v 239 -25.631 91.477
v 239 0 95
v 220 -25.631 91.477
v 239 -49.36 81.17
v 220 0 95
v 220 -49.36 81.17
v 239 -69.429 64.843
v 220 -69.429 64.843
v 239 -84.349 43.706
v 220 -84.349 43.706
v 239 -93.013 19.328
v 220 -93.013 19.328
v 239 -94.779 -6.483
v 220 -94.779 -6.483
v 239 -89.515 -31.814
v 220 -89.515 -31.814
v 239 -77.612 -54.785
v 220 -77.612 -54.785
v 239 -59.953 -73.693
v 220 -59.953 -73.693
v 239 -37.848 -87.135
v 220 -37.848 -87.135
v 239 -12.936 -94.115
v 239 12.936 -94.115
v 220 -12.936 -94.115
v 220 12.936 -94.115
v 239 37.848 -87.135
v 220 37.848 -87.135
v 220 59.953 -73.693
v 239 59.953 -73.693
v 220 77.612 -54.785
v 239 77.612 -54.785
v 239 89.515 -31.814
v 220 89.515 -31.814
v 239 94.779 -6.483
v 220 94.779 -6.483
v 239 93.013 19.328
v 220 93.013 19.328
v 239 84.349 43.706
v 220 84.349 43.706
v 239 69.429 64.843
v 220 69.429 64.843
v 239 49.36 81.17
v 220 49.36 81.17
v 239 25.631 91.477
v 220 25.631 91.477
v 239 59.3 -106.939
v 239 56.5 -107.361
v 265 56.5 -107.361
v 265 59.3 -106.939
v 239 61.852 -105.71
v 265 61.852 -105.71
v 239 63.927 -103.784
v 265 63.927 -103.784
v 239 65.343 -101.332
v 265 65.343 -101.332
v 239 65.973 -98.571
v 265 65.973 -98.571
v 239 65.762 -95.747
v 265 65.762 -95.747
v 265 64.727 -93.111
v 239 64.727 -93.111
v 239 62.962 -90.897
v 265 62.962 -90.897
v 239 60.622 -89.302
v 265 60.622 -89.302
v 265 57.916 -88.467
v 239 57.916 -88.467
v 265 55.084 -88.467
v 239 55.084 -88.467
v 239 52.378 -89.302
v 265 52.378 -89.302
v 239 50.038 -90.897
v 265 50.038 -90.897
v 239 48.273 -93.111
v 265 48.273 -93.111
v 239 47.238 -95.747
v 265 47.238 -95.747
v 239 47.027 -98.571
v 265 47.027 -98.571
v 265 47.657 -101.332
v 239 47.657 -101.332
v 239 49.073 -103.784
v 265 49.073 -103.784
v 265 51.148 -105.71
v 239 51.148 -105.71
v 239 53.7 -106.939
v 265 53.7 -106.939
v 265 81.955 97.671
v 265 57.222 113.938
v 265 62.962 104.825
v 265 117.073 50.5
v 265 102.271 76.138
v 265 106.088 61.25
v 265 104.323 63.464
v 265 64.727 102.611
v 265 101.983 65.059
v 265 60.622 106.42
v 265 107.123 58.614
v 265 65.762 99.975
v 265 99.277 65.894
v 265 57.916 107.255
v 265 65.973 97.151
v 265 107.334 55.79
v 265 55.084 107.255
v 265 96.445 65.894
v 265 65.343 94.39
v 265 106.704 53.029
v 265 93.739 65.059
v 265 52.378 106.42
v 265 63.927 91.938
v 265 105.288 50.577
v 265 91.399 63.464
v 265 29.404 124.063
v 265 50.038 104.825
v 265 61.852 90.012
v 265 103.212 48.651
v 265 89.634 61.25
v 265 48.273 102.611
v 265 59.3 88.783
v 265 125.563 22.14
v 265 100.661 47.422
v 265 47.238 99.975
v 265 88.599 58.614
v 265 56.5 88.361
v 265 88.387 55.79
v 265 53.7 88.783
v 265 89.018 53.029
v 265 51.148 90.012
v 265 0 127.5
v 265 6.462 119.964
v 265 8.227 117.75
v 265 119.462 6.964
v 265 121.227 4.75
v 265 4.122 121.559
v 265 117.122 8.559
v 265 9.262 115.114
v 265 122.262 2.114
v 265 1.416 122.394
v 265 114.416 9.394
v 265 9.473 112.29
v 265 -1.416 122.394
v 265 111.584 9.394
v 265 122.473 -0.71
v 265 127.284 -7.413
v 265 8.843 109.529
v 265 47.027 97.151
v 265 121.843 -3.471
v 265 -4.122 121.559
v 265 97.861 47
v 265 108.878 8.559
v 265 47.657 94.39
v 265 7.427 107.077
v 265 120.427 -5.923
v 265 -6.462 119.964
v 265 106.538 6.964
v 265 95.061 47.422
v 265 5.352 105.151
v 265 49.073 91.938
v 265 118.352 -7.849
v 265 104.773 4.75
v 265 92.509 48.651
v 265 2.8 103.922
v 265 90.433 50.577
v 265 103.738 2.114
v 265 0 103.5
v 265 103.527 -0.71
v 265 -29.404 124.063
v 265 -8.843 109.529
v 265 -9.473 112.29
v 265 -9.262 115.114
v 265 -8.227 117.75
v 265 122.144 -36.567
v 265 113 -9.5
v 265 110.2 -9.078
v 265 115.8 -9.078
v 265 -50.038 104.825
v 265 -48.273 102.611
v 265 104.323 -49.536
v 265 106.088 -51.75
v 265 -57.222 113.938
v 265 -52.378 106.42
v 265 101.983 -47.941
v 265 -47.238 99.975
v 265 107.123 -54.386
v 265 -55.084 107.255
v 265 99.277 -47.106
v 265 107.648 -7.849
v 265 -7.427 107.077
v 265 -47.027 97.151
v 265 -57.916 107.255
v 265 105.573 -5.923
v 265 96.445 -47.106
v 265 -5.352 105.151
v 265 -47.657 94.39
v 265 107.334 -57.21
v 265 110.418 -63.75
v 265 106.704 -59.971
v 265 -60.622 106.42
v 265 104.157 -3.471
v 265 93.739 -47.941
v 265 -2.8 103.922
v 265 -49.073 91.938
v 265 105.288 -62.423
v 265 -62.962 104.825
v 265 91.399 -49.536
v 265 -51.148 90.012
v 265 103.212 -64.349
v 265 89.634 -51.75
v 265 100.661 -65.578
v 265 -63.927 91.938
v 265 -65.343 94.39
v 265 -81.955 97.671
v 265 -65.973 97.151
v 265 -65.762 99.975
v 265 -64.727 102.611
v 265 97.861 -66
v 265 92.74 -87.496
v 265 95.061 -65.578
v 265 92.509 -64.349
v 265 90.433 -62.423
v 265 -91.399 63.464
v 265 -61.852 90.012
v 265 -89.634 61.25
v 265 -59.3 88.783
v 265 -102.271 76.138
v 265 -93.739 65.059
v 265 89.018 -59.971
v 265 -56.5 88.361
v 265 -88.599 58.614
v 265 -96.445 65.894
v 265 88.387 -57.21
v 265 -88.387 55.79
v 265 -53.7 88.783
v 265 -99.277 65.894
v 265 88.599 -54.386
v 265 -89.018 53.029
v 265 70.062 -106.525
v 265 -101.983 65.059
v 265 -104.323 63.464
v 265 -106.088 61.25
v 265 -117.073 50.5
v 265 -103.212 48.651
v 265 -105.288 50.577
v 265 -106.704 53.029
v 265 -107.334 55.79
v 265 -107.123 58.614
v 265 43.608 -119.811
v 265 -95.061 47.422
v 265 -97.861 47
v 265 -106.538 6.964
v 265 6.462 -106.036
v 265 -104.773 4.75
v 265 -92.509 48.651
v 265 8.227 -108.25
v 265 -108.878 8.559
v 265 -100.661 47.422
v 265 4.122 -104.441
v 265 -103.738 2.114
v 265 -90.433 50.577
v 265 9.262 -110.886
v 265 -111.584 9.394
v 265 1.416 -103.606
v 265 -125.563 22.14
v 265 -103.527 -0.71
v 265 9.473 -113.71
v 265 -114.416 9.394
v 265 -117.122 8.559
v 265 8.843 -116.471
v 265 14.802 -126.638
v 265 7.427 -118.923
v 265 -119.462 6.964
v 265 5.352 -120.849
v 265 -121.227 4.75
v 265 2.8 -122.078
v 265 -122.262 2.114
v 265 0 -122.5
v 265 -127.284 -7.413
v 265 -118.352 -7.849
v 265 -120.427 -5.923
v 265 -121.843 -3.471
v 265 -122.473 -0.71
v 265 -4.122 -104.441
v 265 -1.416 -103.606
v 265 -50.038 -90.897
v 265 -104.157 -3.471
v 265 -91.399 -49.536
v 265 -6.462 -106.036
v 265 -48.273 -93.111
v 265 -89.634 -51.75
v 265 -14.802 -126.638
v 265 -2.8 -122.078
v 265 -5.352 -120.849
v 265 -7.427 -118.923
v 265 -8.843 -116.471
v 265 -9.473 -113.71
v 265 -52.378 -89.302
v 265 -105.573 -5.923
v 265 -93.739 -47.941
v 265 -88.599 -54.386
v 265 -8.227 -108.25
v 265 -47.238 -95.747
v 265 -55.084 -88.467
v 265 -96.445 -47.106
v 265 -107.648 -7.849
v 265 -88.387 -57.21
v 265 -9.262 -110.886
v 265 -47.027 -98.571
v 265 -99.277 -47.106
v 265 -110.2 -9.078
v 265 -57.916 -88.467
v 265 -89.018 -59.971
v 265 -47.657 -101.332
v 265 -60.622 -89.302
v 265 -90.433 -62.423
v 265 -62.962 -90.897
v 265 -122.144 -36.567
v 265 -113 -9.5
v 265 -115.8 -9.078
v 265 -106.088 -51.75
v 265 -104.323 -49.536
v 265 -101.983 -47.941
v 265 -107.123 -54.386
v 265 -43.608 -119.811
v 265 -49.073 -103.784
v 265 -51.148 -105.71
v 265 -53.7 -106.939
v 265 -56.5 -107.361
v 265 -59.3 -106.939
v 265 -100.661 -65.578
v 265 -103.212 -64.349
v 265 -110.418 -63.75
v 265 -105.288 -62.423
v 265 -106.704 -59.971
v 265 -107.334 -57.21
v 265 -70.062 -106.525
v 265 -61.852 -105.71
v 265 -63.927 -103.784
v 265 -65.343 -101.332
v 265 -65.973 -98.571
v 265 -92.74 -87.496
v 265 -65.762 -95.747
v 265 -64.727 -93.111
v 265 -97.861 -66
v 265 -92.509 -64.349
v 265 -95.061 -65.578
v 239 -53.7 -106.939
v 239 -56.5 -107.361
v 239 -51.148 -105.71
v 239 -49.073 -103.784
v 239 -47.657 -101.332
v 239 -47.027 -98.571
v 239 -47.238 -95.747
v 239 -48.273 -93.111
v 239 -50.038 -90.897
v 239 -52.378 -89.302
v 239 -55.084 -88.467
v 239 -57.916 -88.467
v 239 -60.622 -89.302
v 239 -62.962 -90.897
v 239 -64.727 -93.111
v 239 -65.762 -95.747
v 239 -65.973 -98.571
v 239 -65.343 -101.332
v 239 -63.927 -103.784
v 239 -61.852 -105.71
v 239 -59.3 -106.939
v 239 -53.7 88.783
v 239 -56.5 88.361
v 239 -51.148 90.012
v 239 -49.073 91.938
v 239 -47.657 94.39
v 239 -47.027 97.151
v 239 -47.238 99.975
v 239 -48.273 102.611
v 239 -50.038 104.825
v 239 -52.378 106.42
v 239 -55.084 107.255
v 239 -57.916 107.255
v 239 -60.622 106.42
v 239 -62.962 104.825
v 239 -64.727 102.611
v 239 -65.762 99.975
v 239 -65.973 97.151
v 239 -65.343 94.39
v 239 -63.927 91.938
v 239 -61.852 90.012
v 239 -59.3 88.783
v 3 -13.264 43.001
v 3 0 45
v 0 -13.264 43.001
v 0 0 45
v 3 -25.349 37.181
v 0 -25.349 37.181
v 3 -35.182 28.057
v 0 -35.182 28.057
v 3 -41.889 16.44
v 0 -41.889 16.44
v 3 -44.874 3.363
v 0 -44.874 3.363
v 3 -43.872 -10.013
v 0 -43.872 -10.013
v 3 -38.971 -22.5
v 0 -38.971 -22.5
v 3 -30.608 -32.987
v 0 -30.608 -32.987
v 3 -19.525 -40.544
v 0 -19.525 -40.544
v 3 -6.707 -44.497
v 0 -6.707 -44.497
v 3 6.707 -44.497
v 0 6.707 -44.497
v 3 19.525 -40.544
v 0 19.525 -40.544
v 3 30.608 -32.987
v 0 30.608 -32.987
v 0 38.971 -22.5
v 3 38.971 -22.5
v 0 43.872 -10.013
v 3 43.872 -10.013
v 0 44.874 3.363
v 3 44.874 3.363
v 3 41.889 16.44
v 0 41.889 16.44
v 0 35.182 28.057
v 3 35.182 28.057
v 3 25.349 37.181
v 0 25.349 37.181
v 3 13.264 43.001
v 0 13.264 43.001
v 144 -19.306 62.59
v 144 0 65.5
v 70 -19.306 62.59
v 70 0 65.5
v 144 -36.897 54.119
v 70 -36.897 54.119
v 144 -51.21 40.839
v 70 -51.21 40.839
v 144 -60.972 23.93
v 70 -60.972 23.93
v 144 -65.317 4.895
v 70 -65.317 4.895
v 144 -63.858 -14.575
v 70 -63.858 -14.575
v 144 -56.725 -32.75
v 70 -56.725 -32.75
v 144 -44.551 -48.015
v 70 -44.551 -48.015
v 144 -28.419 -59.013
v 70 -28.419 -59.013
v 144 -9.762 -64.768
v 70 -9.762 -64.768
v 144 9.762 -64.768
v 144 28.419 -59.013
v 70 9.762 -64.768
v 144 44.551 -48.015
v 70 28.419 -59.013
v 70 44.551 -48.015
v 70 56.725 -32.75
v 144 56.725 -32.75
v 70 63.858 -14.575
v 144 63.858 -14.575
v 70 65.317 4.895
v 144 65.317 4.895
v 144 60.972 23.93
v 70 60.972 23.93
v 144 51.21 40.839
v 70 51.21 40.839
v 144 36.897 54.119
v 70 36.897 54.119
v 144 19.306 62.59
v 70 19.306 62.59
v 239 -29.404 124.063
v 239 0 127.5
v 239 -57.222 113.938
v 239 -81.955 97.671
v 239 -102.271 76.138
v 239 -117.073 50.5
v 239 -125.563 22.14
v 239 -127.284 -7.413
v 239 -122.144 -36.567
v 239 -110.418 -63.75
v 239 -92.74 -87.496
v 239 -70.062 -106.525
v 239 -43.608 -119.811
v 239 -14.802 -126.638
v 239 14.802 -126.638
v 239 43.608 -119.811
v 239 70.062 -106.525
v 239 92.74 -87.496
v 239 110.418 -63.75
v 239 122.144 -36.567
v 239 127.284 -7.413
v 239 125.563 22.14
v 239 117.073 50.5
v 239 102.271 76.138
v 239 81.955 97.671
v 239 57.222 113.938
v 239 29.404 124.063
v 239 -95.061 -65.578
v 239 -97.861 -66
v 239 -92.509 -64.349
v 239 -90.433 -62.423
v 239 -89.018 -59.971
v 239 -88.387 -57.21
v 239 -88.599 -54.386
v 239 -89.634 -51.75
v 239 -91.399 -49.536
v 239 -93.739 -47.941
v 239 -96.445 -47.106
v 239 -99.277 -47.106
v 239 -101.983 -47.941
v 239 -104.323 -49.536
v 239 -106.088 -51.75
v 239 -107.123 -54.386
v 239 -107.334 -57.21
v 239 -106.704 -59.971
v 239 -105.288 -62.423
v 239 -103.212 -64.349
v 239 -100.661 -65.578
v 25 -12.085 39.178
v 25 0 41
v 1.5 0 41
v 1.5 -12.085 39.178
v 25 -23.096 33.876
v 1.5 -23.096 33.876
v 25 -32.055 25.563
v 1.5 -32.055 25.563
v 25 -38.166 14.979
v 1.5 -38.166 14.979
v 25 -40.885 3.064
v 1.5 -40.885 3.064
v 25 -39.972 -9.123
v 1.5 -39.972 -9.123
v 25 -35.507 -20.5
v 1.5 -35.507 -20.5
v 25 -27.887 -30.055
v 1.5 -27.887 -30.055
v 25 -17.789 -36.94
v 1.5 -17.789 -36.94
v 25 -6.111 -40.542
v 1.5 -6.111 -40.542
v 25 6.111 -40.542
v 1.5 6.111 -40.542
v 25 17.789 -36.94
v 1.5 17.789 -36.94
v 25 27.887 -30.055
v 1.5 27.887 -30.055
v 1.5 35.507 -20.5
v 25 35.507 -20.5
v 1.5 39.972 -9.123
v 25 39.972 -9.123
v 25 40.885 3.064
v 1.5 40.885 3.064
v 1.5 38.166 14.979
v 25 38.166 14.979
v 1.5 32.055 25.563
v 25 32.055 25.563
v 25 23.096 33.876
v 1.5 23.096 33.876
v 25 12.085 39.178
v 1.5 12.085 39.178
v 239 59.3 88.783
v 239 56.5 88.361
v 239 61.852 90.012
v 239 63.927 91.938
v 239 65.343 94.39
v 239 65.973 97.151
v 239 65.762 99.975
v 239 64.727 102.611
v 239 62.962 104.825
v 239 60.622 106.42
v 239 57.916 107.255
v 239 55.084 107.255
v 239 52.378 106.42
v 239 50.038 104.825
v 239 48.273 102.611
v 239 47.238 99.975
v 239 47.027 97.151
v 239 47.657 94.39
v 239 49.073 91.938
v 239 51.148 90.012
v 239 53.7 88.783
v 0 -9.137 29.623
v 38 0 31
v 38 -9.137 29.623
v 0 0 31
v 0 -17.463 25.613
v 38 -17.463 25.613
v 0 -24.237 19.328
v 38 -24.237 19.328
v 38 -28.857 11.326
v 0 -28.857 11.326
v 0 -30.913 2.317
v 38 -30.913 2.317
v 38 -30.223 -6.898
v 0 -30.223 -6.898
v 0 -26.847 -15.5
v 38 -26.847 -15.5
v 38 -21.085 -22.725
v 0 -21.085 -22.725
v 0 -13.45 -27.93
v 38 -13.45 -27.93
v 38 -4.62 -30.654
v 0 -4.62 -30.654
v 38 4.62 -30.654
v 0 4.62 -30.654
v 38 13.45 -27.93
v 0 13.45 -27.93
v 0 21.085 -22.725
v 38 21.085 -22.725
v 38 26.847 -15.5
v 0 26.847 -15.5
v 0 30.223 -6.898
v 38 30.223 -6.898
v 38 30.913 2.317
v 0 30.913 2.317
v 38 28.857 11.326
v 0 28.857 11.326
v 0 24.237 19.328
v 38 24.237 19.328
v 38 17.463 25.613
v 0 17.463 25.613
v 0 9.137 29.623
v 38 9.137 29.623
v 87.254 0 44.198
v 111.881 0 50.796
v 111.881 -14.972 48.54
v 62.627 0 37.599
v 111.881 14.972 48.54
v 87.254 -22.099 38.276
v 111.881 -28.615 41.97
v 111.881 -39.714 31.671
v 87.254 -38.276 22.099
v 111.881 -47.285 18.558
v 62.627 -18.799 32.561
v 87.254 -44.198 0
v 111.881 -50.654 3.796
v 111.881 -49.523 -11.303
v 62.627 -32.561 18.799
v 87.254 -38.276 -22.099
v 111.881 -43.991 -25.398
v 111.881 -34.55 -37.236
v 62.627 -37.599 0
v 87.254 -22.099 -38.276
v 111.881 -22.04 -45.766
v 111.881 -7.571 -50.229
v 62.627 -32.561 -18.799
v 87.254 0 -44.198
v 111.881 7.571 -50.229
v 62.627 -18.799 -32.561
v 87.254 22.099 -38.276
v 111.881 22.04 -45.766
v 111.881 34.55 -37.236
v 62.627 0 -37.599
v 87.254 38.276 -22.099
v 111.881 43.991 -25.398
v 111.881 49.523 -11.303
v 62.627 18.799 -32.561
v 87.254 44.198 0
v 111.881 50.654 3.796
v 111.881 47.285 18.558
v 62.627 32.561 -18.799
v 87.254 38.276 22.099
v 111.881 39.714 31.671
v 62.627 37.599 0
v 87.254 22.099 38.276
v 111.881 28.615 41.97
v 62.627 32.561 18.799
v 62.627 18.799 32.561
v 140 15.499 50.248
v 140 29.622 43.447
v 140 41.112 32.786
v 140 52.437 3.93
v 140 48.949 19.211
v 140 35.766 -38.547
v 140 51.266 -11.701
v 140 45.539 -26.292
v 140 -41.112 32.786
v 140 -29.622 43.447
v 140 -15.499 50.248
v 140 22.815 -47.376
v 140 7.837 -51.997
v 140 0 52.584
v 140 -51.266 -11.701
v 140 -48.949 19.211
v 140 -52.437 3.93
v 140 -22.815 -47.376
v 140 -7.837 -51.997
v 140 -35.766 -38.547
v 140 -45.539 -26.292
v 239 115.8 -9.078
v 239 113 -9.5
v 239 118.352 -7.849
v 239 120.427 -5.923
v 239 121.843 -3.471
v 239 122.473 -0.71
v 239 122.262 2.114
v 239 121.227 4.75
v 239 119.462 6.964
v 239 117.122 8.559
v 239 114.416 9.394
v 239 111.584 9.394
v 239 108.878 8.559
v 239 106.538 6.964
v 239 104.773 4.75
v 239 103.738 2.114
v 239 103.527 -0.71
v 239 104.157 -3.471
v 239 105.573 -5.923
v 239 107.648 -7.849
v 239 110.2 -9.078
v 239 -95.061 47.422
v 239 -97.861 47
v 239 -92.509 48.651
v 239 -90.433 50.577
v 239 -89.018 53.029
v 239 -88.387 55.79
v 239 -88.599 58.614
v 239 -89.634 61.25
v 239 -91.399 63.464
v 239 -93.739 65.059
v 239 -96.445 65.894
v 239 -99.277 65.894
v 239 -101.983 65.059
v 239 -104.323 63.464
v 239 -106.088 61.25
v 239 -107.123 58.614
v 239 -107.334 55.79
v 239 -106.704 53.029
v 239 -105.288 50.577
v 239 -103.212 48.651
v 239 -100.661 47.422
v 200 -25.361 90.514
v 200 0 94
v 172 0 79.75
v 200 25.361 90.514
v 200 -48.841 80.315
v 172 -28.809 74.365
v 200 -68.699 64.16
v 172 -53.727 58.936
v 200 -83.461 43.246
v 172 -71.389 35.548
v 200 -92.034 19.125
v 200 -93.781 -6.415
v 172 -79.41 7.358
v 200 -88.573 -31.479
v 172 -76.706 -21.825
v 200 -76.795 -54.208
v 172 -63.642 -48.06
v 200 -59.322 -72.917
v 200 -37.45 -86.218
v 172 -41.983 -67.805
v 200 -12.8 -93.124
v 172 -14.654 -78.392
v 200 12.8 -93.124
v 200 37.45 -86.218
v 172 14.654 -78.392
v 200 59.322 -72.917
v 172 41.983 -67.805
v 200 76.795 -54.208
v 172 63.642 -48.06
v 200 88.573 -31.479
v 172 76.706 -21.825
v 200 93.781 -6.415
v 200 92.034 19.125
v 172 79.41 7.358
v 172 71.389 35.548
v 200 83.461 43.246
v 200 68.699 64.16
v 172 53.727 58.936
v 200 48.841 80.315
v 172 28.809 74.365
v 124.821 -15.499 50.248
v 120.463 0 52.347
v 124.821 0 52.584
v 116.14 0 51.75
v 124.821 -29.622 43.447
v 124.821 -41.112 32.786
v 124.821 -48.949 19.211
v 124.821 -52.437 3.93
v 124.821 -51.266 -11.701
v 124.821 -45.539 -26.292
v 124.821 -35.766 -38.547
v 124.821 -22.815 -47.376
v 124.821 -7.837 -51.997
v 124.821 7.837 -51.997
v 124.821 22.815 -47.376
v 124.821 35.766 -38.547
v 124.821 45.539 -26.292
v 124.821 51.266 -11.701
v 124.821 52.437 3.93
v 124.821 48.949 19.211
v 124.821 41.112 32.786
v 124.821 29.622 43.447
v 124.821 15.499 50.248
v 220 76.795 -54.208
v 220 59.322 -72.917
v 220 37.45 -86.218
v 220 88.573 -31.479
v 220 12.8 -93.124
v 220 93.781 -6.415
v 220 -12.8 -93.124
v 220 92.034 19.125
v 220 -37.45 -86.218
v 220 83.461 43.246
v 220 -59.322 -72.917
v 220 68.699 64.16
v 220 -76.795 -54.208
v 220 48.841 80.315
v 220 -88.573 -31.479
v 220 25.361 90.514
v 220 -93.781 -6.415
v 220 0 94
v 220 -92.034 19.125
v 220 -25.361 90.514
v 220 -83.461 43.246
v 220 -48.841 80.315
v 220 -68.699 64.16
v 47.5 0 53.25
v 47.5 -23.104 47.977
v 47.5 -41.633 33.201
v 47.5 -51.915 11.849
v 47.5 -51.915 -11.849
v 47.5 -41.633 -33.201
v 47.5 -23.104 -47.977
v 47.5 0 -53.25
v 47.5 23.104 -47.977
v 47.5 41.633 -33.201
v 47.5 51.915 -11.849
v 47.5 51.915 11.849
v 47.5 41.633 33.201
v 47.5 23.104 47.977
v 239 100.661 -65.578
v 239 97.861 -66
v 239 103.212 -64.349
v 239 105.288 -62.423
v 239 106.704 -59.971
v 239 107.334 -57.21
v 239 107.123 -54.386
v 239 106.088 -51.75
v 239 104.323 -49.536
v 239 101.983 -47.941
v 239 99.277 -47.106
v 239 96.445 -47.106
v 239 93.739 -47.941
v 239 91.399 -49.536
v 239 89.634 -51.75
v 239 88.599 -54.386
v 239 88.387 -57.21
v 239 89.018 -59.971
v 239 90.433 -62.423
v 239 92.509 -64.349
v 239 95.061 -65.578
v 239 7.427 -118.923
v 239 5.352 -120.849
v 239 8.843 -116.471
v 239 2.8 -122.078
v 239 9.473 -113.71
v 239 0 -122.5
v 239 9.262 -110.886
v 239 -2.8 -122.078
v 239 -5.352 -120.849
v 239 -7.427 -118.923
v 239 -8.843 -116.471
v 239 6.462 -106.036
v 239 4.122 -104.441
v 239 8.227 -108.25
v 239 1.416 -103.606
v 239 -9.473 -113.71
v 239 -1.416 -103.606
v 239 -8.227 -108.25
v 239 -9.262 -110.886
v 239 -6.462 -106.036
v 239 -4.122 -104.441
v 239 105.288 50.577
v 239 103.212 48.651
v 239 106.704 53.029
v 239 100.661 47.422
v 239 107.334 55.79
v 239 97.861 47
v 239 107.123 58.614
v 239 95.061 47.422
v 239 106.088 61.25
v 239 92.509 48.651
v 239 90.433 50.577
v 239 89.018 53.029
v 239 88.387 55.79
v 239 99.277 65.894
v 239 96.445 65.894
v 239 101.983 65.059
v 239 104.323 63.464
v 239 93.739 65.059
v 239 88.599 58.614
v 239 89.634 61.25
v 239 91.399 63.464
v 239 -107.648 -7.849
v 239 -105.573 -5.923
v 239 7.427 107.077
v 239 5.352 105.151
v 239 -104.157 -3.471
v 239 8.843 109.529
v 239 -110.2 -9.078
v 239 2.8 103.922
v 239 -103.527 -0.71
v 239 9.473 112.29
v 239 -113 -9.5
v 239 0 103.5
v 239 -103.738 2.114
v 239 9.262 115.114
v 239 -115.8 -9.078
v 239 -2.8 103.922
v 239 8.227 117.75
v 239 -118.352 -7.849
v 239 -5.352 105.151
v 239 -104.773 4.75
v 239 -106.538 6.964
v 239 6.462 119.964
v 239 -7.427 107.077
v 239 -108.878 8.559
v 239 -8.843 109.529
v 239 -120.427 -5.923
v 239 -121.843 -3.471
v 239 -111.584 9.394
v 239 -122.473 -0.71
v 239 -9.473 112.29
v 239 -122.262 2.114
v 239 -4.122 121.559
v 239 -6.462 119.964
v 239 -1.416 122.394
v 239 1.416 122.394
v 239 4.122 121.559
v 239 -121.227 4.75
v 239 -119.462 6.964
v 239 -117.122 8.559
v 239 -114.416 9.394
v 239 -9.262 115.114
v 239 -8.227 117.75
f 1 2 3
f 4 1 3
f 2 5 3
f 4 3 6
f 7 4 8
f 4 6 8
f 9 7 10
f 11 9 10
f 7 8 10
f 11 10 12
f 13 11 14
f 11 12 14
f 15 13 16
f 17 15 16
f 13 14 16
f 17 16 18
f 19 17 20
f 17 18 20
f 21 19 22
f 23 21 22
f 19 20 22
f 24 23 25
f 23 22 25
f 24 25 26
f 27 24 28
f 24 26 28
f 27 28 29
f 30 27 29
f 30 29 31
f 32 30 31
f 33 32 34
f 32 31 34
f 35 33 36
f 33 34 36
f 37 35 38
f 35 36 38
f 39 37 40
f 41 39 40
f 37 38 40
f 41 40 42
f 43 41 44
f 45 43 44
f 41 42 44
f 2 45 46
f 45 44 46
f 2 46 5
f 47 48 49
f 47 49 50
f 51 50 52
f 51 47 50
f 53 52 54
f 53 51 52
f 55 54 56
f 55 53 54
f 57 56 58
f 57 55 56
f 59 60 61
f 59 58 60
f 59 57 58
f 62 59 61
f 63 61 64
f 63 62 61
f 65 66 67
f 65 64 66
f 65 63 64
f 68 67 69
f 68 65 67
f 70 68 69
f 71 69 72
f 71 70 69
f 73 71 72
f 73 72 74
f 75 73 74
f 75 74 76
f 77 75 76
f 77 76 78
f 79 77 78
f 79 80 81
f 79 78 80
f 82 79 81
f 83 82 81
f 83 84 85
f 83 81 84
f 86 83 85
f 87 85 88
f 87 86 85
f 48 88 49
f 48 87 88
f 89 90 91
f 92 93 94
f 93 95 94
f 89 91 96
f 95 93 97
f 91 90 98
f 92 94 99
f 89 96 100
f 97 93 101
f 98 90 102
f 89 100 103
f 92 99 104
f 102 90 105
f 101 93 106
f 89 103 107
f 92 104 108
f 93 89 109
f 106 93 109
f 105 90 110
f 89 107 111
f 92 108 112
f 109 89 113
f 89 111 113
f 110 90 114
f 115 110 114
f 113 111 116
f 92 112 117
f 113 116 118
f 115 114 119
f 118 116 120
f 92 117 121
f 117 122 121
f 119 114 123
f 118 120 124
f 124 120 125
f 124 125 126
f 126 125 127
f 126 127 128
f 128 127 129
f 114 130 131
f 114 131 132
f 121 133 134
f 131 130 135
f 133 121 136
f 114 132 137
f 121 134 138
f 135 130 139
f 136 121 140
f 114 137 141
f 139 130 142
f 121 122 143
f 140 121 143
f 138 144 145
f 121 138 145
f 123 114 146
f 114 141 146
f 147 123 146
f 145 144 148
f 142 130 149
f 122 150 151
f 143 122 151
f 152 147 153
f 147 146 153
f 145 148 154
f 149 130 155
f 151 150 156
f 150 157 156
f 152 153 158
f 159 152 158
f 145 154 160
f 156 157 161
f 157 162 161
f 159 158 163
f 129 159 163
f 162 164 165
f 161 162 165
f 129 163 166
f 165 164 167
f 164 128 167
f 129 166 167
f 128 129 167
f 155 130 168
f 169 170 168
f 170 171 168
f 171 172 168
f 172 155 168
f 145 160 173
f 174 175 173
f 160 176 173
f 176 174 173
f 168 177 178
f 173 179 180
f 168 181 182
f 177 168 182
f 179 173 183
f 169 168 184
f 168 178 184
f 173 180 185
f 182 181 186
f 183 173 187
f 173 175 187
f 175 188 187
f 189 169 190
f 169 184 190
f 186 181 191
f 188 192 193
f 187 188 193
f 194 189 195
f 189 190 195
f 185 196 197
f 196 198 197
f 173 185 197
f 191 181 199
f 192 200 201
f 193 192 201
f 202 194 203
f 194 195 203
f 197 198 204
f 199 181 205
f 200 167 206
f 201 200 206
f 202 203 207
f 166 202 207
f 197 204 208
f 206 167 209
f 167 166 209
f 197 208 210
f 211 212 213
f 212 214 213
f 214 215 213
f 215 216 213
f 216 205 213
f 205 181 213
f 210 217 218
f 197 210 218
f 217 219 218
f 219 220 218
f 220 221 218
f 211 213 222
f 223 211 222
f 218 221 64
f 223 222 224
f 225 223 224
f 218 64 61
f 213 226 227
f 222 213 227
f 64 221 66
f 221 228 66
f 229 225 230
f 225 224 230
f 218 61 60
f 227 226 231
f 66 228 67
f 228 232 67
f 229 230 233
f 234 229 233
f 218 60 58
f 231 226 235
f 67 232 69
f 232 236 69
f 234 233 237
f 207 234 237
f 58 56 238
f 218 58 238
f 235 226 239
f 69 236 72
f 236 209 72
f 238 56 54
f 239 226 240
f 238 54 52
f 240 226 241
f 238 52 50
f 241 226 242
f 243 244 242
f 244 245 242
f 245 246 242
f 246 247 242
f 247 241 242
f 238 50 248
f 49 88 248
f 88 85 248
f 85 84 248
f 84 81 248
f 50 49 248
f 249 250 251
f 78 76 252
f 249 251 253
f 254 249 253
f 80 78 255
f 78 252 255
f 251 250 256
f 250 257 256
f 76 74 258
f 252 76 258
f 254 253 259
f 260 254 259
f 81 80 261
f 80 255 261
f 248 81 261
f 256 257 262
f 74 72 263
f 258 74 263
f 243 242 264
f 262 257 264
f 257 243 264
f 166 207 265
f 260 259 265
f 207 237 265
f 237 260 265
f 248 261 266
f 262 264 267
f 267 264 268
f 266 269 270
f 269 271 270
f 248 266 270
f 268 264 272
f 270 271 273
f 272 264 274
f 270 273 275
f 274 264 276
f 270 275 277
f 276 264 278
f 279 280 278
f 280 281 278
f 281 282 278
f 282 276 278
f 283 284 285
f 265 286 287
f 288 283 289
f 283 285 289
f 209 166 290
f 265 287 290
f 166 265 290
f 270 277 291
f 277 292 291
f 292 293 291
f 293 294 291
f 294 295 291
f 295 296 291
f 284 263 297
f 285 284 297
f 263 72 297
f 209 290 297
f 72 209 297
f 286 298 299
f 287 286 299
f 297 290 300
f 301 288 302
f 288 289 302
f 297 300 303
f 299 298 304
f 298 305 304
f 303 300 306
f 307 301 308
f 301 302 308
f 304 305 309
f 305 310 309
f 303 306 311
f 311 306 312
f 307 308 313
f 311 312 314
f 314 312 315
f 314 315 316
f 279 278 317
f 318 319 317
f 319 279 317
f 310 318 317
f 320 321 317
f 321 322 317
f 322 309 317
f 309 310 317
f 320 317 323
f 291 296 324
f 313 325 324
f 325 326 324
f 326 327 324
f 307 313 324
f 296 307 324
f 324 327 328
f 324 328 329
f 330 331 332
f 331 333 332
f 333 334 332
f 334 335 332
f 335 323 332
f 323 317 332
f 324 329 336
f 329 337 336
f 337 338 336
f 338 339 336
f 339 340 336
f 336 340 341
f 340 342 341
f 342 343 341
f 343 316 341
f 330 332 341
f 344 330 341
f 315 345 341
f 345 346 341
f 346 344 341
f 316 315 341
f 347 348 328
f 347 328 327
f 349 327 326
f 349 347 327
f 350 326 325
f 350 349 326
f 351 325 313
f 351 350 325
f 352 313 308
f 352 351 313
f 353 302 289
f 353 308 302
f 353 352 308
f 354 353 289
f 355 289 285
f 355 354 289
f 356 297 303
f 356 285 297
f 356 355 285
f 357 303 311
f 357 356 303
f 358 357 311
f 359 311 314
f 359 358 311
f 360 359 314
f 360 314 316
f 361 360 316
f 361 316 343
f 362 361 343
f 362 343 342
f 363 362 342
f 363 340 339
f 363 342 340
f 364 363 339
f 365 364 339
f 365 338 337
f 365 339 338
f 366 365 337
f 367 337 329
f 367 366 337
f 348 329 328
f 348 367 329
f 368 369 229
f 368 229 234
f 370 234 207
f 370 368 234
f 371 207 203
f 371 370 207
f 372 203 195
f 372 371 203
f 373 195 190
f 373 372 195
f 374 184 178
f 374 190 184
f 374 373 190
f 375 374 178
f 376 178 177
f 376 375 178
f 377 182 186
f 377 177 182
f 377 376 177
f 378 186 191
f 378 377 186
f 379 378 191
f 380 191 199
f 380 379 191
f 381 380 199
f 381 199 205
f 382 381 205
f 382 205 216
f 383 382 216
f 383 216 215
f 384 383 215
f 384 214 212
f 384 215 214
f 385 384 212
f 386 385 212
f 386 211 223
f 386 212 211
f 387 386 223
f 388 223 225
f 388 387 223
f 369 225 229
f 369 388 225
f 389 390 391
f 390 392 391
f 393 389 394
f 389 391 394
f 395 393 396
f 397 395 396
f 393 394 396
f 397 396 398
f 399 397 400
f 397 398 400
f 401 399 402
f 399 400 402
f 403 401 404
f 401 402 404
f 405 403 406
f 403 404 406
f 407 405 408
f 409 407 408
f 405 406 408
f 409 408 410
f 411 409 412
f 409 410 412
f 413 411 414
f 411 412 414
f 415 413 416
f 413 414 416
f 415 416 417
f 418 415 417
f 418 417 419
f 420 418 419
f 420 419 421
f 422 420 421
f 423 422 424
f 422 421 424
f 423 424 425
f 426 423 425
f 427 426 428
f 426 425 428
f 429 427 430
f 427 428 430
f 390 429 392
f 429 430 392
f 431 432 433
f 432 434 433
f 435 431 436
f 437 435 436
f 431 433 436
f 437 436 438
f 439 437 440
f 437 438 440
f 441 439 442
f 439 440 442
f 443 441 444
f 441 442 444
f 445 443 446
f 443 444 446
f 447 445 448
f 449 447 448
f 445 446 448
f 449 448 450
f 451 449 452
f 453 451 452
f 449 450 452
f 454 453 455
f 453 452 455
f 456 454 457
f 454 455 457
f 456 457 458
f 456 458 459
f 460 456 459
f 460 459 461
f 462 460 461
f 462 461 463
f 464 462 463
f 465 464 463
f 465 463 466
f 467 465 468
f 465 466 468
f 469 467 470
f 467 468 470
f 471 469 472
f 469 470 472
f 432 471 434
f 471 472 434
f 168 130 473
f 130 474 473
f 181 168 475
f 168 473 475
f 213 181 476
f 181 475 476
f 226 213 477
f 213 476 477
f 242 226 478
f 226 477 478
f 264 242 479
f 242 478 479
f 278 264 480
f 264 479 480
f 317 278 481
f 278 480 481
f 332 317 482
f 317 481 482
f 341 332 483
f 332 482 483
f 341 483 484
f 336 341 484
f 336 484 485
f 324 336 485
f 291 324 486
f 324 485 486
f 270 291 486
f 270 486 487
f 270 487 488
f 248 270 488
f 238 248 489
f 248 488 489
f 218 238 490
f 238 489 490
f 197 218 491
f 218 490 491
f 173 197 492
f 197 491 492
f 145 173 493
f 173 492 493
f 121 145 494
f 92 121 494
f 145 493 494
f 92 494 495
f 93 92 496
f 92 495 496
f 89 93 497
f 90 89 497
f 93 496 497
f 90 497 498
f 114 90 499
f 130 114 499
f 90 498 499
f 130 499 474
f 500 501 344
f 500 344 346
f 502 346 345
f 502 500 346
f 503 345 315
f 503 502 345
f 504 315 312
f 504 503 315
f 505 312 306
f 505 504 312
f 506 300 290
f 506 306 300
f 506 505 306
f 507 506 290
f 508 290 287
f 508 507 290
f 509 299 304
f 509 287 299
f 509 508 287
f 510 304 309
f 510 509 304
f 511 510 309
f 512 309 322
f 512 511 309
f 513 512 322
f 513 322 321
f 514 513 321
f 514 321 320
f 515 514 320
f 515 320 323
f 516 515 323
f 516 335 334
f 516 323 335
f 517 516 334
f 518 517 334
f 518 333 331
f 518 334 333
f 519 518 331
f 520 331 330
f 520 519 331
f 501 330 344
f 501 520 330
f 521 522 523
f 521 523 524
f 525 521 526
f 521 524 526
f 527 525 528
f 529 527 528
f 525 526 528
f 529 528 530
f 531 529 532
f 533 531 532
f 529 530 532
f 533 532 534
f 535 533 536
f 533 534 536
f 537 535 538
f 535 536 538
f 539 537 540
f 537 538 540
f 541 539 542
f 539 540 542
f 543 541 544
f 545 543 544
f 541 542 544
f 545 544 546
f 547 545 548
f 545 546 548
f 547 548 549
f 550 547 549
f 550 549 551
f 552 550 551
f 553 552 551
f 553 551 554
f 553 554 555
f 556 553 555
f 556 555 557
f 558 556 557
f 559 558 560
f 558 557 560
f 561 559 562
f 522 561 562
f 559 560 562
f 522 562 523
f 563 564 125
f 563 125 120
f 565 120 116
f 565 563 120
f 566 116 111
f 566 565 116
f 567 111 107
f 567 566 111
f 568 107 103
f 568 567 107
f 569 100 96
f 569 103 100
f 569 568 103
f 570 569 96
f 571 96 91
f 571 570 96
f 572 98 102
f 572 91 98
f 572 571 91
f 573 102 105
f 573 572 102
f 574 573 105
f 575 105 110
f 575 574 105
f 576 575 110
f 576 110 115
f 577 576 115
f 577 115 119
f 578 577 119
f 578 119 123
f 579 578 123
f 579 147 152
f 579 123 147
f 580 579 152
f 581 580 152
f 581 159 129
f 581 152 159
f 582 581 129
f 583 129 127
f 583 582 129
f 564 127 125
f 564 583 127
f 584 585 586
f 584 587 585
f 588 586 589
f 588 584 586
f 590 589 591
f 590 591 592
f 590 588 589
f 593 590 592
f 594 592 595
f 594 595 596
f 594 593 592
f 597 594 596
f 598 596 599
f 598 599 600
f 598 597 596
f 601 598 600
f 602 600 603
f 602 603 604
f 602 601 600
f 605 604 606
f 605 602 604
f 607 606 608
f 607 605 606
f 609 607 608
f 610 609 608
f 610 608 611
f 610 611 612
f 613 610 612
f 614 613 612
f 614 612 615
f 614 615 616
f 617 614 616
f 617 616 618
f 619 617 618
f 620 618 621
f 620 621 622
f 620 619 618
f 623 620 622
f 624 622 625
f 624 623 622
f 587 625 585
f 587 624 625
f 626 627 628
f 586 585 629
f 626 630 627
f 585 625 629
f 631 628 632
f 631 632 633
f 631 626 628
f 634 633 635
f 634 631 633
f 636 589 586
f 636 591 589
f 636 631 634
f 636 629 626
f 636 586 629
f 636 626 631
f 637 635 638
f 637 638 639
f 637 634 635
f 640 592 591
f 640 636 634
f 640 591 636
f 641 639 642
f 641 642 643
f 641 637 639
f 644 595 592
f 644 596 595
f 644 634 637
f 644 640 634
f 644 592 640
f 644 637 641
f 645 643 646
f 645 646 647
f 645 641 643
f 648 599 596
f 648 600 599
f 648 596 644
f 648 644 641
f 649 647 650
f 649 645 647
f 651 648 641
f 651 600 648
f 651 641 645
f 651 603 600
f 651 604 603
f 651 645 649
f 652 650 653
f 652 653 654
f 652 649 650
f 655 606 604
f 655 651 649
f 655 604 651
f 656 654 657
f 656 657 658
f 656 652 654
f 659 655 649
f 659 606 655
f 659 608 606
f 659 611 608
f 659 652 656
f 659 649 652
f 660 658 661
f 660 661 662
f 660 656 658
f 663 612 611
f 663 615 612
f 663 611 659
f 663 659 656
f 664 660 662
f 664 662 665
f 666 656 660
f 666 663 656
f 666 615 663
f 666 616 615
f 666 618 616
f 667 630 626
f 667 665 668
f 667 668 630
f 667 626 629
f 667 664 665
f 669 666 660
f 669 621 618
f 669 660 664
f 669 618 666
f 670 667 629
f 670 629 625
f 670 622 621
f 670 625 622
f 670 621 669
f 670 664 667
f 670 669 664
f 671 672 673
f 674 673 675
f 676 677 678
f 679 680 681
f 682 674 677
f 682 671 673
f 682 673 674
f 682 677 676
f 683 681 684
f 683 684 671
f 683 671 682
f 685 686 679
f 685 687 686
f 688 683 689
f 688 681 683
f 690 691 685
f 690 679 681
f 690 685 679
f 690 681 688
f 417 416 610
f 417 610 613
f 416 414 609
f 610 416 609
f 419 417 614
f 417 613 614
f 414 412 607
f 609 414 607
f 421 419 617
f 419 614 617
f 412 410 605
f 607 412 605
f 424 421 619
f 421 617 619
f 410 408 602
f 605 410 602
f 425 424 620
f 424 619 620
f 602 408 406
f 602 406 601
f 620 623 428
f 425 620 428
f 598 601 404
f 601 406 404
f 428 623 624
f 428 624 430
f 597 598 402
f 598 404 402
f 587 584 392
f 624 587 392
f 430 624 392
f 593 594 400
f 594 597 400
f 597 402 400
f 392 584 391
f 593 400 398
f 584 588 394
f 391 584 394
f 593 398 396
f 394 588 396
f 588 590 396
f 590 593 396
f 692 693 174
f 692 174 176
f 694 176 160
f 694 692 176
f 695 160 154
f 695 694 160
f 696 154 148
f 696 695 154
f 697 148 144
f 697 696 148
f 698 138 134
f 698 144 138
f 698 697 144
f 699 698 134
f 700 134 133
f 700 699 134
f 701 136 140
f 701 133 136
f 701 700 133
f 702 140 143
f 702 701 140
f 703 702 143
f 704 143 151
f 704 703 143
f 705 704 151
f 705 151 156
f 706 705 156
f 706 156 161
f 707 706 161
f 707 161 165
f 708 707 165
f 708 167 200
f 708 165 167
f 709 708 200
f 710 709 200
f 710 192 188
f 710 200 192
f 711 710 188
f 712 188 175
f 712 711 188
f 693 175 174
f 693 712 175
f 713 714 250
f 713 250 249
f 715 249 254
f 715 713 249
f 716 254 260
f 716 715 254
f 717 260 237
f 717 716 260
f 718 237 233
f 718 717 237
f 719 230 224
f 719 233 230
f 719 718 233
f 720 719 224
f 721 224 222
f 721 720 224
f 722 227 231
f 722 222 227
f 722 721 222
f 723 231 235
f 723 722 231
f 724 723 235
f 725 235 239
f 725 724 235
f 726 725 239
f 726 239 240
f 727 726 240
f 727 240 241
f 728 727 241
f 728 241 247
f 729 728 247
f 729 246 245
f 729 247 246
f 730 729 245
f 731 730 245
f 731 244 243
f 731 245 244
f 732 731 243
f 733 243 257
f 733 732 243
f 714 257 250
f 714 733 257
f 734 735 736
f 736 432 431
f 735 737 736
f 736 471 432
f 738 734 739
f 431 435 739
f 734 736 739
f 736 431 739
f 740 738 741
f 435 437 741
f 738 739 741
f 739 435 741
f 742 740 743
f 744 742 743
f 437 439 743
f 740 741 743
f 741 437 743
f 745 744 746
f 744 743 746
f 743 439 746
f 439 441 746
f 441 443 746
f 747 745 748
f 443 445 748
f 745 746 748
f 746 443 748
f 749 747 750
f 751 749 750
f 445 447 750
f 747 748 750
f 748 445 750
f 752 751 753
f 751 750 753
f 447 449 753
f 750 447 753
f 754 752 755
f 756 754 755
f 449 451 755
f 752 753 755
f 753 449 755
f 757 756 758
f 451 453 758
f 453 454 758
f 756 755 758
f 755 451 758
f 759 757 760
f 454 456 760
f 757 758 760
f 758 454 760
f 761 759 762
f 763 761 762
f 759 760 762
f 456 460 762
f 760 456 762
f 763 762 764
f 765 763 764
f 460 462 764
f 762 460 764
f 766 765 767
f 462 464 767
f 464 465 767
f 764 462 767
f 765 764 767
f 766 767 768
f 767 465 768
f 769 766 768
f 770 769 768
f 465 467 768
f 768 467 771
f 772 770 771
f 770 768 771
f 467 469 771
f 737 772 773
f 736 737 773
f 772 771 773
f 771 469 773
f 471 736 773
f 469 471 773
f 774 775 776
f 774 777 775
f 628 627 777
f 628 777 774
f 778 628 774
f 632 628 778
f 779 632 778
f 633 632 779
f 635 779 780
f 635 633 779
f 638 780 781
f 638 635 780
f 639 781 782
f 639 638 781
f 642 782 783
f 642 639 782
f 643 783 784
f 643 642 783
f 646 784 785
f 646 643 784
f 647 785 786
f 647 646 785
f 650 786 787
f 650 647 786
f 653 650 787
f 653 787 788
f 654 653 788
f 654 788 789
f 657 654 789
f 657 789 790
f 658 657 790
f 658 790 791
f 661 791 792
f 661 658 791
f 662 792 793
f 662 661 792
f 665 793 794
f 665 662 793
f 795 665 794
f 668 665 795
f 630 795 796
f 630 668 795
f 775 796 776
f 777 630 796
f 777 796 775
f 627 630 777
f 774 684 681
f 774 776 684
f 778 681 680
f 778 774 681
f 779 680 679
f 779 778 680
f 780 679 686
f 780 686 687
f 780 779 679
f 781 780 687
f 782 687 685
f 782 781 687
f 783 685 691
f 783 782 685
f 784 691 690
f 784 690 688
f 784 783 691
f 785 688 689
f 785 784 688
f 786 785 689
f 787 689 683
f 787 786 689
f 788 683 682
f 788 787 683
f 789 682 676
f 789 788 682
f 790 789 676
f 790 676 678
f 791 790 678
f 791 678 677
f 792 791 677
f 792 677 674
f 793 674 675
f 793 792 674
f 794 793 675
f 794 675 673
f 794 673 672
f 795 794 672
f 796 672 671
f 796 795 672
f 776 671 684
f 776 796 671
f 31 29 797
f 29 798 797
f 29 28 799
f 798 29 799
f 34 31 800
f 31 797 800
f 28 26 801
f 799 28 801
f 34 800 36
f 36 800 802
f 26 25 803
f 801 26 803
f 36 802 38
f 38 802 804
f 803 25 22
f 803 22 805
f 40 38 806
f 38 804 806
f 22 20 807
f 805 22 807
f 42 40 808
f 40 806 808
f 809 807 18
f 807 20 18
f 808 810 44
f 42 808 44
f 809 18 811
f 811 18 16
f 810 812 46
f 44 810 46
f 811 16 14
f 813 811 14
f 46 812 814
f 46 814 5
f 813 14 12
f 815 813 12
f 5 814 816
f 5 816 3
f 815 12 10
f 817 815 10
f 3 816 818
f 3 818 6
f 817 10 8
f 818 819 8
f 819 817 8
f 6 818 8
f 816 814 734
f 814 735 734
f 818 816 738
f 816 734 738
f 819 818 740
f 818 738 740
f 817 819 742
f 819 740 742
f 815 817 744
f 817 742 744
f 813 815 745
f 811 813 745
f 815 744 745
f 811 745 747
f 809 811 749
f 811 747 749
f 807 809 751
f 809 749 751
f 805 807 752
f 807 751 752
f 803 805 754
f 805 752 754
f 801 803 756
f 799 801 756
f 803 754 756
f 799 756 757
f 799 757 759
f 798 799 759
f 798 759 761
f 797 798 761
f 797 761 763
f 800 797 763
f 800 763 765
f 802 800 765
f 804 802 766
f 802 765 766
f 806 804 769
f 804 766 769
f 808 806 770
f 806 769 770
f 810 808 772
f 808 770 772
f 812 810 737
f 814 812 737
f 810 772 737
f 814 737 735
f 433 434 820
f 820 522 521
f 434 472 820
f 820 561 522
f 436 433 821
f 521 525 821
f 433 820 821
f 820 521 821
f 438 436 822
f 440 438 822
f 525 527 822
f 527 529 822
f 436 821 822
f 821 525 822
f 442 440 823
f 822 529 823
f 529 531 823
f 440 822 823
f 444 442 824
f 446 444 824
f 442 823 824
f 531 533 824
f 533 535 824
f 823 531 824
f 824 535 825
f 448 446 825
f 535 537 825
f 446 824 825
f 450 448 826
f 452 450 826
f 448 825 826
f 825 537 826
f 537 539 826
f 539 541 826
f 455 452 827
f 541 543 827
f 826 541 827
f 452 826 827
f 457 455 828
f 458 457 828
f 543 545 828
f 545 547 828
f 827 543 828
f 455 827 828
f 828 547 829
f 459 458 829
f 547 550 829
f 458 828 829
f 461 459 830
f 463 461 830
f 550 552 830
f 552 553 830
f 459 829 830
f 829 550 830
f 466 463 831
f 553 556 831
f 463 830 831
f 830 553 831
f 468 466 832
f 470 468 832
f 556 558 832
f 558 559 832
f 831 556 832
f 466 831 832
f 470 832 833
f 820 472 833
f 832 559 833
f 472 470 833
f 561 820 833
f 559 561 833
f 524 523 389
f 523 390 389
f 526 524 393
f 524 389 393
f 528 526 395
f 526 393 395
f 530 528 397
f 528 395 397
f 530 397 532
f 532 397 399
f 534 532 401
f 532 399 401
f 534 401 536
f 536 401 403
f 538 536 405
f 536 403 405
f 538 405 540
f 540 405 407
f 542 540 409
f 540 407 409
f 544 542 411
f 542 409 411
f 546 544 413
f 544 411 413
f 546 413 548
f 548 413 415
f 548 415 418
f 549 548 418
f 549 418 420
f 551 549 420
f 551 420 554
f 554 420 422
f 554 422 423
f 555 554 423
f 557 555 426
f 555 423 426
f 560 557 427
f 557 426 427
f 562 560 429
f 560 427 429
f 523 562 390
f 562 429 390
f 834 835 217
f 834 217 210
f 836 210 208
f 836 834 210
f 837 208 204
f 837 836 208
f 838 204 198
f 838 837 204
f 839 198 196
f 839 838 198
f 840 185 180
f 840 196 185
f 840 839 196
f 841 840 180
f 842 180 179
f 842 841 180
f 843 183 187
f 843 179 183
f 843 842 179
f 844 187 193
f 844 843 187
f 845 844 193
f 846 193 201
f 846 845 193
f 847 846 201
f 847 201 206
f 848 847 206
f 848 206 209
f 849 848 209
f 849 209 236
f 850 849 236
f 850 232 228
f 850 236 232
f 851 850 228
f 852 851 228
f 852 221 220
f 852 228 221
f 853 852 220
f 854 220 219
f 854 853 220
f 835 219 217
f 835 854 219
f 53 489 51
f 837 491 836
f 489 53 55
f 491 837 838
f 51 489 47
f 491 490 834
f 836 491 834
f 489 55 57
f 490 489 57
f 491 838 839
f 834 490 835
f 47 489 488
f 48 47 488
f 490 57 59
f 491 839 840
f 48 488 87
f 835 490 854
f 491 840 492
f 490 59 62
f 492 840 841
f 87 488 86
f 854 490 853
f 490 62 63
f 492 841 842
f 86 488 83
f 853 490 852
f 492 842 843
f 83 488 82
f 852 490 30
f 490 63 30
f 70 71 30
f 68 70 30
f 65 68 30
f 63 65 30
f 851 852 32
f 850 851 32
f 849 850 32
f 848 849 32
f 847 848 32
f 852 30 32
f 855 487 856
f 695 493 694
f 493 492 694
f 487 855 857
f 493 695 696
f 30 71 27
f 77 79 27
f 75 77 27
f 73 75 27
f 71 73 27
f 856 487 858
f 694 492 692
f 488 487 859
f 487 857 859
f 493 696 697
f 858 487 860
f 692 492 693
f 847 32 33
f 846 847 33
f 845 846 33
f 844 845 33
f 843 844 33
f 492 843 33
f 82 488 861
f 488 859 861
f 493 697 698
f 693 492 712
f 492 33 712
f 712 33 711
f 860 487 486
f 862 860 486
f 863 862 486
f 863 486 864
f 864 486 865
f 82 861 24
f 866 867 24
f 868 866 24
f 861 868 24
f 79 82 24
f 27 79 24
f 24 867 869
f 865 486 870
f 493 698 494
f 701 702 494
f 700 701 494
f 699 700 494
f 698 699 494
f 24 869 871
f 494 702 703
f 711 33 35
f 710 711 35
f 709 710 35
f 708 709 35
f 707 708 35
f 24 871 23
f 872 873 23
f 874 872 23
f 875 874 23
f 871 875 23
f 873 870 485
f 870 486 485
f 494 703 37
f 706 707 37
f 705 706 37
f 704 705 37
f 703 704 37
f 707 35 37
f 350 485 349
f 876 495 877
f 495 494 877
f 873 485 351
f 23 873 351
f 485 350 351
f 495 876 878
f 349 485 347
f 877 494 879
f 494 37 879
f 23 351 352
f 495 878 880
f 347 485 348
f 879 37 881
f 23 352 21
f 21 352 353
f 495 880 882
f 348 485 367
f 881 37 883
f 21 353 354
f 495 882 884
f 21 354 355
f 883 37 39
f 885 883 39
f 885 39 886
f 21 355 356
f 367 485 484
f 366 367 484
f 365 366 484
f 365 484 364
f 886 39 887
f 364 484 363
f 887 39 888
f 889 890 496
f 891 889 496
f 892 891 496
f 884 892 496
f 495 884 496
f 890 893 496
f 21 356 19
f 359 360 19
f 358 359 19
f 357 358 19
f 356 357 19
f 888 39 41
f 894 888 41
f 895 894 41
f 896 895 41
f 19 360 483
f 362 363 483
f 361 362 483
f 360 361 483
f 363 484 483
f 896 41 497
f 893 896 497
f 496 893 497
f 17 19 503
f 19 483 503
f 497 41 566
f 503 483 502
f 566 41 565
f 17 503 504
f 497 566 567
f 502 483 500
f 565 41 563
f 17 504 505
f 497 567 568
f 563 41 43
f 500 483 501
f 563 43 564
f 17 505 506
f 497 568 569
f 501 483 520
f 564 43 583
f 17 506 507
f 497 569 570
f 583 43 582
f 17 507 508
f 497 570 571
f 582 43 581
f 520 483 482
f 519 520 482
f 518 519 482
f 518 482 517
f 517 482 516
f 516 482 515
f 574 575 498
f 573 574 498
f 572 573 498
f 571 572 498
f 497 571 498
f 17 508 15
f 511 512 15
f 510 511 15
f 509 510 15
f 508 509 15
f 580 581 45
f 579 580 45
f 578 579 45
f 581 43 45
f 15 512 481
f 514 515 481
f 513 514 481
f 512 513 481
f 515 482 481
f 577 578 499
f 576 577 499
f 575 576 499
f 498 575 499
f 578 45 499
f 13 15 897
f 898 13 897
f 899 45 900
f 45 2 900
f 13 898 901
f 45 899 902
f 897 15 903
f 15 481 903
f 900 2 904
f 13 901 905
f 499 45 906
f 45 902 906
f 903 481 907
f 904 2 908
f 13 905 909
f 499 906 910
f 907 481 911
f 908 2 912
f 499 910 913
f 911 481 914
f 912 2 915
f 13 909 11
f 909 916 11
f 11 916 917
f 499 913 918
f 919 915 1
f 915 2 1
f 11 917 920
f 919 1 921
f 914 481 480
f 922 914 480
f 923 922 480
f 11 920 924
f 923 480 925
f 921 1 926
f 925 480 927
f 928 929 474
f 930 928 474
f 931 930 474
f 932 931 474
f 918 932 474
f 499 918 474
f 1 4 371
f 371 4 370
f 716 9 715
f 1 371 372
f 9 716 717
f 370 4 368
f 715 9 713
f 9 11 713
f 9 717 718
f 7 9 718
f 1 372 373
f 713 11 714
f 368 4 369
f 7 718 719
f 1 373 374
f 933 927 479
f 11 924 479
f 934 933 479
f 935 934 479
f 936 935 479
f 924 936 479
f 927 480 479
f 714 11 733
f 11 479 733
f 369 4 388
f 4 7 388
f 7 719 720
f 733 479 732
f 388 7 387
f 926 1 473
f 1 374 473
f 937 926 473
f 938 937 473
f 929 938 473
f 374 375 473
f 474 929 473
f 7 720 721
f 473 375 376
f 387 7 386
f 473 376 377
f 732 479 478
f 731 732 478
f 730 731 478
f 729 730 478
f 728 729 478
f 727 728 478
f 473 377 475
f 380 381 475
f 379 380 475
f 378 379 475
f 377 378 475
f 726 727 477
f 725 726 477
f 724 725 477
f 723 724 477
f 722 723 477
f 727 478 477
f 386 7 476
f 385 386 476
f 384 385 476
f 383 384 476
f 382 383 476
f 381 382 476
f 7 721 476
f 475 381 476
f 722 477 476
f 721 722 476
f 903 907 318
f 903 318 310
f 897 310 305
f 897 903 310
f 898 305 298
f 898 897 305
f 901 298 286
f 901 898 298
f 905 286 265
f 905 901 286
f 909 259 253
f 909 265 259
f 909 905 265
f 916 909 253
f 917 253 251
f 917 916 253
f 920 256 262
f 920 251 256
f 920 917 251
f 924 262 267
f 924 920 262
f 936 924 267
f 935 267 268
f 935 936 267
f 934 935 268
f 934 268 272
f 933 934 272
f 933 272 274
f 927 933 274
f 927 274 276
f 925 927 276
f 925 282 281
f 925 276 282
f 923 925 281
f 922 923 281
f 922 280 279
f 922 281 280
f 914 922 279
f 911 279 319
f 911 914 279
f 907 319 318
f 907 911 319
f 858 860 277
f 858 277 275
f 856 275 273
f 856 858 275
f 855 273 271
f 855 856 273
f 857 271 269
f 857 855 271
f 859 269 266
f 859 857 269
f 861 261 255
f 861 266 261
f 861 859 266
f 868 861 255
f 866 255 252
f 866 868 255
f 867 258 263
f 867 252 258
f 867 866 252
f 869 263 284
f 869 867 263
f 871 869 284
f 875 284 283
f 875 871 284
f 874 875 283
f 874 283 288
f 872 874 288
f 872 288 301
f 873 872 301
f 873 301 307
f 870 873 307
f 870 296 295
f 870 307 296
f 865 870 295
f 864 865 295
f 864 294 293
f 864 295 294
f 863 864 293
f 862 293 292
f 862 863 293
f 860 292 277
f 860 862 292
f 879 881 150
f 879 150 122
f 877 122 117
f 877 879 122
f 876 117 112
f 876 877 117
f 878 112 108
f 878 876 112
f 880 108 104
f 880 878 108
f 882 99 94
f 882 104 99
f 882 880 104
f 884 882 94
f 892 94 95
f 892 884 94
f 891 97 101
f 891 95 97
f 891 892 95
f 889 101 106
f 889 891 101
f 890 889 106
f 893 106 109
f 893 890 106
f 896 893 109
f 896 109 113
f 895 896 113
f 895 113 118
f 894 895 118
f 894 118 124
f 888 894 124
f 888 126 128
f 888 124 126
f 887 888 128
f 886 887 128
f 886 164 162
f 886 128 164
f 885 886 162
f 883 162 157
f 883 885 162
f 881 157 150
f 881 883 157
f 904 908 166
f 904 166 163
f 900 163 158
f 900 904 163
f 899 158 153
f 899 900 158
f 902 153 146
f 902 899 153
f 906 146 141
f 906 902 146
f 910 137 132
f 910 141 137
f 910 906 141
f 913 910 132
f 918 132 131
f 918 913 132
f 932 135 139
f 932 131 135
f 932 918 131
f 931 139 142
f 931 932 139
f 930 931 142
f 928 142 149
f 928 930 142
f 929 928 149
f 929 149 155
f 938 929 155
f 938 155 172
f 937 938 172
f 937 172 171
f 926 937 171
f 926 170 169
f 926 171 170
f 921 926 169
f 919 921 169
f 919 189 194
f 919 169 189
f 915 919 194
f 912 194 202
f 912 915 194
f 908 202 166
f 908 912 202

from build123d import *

# Parameters (mm, degrees)
SKETCH_3_R           = 9.5
CUT_EXTRUDE_1_DEPTH  = 321.526909947
SKETCH_4_R           = 9.5
CUT_EXTRUDE_2_DEPTH  = 321.526909947
SKETCH_5_R           = 9.5
CUT_EXTRUDE_3_DEPTH  = 321.526909947
SKETCH_6_R           = 9.5
CUT_EXTRUDE_4_DEPTH  = 321.526909947
SKETCH_7_R           = 9.5
CUT_EXTRUDE_5_DEPTH  = 321.526909947
SKETCH_8_R           = 9.5
CUT_EXTRUDE_6_DEPTH  = 321.526909947
SKETCH_9_R           = 9.5
CUT_EXTRUDE_7_DEPTH  = 321.526909947
SKETCH_10_R          = 9.5
CUT_EXTRUDE_8_DEPTH  = 321.526909947
SKETCH_11_R          = 9.5
CUT_EXTRUDE_9_DEPTH  = 321.526909947
SKETCH_12_R          = 9.5
CUT_EXTRUDE_10_DEPTH = 321.526909947
SKETCH_13_R          = 9.5
CUT_EXTRUDE_11_DEPTH = 321.526909947
SKETCH_14_R          = 9.5
CUT_EXTRUDE_12_DEPTH = 321.526909947


with BuildPart() as part:
    # Эскиз1 → Повернуть1 (revolve)
    with BuildSketch(Plane.XY, mode=Mode.PRIVATE) as revolve_1_sk:
        Polygon((0, 0), (265, 0), (265, 127.5), (239, 127.5), (239, 100), (239, 95), (220, 95), (220, 94), (200, 94), (144, 65.5), (70, 65.5), (25, 41), (1.5, 41), (3, 45), (0, 45), align=None)
    revolve(revolve_1_sk.sketch.rotate(Axis((0, 0, 0), (1, 0, 0)), 90), axis=Axis((0, 0, 0), (1, 0, 0)))

    # Эскиз2 → Вырез-Повернуть1 (revolve, cut)
    with BuildSketch(Plane.XY, mode=Mode.PRIVATE) as cut_revolve_1_sk:
        with BuildLine():
            Line((0, 0), (140, 0))
            Line((140, 0), (140, 52.583909796))
            Line((140, 52.583909796), (124.820646354, 52.583909796))
            ThreePointArc((124.820646354, 52.583909796), (118.294984956, 52.093441156), (111.880765, 50.796291))
            Line((111.880765, 50.796291), (38, 31))
            Line((38, 31), (0, 31))
            Line((0, 31), (0, 0))
        make_face()
    revolve(cut_revolve_1_sk.sketch.rotate(Axis((0, 0, 0), (1, 0, 0)), 90), axis=Axis((0, 0, 0), (1, 0, 0)), mode=Mode.SUBTRACT)

    # Эскиз3 → Вырез-Вытянуть1 (cut, through all)
    with BuildSketch(Plane(origin=(0, 0, 0), x_dir=(0, 0, -1), z_dir=(1, 0, 0))):
        with Locations((0, 113)):
            Circle(SKETCH_3_R)
    extrude(amount=CUT_EXTRUDE_1_DEPTH, mode=Mode.SUBTRACT)

    # Эскиз4 → Вырез-Вытянуть2 (cut, through all)
    with BuildSketch(Plane(origin=(0, 0, 0), x_dir=(0, 0, -1), z_dir=(1, 0, 0))):
        with Locations((-56.5, 97.860870628)):
            Circle(SKETCH_4_R)
    extrude(amount=CUT_EXTRUDE_2_DEPTH, mode=Mode.SUBTRACT)

    # Эскиз5 → Вырез-Вытянуть3 (cut, through all)
    with BuildSketch(Plane(origin=(0, 0, 0), x_dir=(0, 0, -1), z_dir=(1, 0, 0))):
        with Locations((-97.860870628, 56.5)):
            Circle(SKETCH_5_R)
    extrude(amount=CUT_EXTRUDE_3_DEPTH, mode=Mode.SUBTRACT)

    # Эскиз6 → Вырез-Вытянуть4 (cut, through all)
    with BuildSketch(Plane(origin=(0, 0, 0), x_dir=(0, 0, -1), z_dir=(1, 0, 0))):
        with Locations((-113, 0)):
            Circle(SKETCH_6_R)
    extrude(amount=CUT_EXTRUDE_4_DEPTH, mode=Mode.SUBTRACT)

    # Эскиз7 → Вырез-Вытянуть5 (cut, through all)
    with BuildSketch(Plane(origin=(0, 0, 0), x_dir=(0, 0, -1), z_dir=(1, 0, 0))):
        with Locations((-97.860870628, -56.5)):
            Circle(SKETCH_7_R)
    extrude(amount=CUT_EXTRUDE_5_DEPTH, mode=Mode.SUBTRACT)

    # Эскиз8 → Вырез-Вытянуть6 (cut, through all)
    with BuildSketch(Plane(origin=(0, 0, 0), x_dir=(0, 0, -1), z_dir=(1, 0, 0))):
        with Locations((-56.5, -97.860870628)):
            Circle(SKETCH_8_R)
    extrude(amount=CUT_EXTRUDE_6_DEPTH, mode=Mode.SUBTRACT)

    # Эскиз9 → Вырез-Вытянуть7 (cut, through all)
    with BuildSketch(Plane(origin=(0, 0, 0), x_dir=(0, 0, -1), z_dir=(1, 0, 0))):
        with Locations((0, -113)):
            Circle(SKETCH_9_R)
    extrude(amount=CUT_EXTRUDE_7_DEPTH, mode=Mode.SUBTRACT)

    # Эскиз10 → Вырез-Вытянуть8 (cut, through all)
    with BuildSketch(Plane(origin=(0, 0, 0), x_dir=(0, 0, -1), z_dir=(1, 0, 0))):
        with Locations((56.5, -97.860870628)):
            Circle(SKETCH_10_R)
    extrude(amount=CUT_EXTRUDE_8_DEPTH, mode=Mode.SUBTRACT)

    # Эскиз11 → Вырез-Вытянуть9 (cut, through all)
    with BuildSketch(Plane(origin=(0, 0, 0), x_dir=(0, 0, -1), z_dir=(1, 0, 0))):
        with Locations((97.860870628, -56.5)):
            Circle(SKETCH_11_R)
    extrude(amount=CUT_EXTRUDE_9_DEPTH, mode=Mode.SUBTRACT)

    # Эскиз12 → Вырез-Вытянуть10 (cut, through all)
    with BuildSketch(Plane(origin=(0, 0, 0), x_dir=(0, 0, -1), z_dir=(1, 0, 0))):
        with Locations((113, 0)):
            Circle(SKETCH_12_R)
    extrude(amount=CUT_EXTRUDE_10_DEPTH, mode=Mode.SUBTRACT)

    # Эскиз13 → Вырез-Вытянуть11 (cut, through all)
    with BuildSketch(Plane(origin=(0, 0, 0), x_dir=(0, 0, -1), z_dir=(1, 0, 0))):
        with Locations((97.860870628, 56.5)):
            Circle(SKETCH_13_R)
    extrude(amount=CUT_EXTRUDE_11_DEPTH, mode=Mode.SUBTRACT)

    # Эскиз14 → Вырез-Вытянуть12 (cut, through all)
    with BuildSketch(Plane(origin=(0, 0, 0), x_dir=(0, 0, -1), z_dir=(1, 0, 0))):
        with Locations((56.5, 97.860870628)):
            Circle(SKETCH_14_R)
    extrude(amount=CUT_EXTRUDE_12_DEPTH, mode=Mode.SUBTRACT)


solid = part.part
